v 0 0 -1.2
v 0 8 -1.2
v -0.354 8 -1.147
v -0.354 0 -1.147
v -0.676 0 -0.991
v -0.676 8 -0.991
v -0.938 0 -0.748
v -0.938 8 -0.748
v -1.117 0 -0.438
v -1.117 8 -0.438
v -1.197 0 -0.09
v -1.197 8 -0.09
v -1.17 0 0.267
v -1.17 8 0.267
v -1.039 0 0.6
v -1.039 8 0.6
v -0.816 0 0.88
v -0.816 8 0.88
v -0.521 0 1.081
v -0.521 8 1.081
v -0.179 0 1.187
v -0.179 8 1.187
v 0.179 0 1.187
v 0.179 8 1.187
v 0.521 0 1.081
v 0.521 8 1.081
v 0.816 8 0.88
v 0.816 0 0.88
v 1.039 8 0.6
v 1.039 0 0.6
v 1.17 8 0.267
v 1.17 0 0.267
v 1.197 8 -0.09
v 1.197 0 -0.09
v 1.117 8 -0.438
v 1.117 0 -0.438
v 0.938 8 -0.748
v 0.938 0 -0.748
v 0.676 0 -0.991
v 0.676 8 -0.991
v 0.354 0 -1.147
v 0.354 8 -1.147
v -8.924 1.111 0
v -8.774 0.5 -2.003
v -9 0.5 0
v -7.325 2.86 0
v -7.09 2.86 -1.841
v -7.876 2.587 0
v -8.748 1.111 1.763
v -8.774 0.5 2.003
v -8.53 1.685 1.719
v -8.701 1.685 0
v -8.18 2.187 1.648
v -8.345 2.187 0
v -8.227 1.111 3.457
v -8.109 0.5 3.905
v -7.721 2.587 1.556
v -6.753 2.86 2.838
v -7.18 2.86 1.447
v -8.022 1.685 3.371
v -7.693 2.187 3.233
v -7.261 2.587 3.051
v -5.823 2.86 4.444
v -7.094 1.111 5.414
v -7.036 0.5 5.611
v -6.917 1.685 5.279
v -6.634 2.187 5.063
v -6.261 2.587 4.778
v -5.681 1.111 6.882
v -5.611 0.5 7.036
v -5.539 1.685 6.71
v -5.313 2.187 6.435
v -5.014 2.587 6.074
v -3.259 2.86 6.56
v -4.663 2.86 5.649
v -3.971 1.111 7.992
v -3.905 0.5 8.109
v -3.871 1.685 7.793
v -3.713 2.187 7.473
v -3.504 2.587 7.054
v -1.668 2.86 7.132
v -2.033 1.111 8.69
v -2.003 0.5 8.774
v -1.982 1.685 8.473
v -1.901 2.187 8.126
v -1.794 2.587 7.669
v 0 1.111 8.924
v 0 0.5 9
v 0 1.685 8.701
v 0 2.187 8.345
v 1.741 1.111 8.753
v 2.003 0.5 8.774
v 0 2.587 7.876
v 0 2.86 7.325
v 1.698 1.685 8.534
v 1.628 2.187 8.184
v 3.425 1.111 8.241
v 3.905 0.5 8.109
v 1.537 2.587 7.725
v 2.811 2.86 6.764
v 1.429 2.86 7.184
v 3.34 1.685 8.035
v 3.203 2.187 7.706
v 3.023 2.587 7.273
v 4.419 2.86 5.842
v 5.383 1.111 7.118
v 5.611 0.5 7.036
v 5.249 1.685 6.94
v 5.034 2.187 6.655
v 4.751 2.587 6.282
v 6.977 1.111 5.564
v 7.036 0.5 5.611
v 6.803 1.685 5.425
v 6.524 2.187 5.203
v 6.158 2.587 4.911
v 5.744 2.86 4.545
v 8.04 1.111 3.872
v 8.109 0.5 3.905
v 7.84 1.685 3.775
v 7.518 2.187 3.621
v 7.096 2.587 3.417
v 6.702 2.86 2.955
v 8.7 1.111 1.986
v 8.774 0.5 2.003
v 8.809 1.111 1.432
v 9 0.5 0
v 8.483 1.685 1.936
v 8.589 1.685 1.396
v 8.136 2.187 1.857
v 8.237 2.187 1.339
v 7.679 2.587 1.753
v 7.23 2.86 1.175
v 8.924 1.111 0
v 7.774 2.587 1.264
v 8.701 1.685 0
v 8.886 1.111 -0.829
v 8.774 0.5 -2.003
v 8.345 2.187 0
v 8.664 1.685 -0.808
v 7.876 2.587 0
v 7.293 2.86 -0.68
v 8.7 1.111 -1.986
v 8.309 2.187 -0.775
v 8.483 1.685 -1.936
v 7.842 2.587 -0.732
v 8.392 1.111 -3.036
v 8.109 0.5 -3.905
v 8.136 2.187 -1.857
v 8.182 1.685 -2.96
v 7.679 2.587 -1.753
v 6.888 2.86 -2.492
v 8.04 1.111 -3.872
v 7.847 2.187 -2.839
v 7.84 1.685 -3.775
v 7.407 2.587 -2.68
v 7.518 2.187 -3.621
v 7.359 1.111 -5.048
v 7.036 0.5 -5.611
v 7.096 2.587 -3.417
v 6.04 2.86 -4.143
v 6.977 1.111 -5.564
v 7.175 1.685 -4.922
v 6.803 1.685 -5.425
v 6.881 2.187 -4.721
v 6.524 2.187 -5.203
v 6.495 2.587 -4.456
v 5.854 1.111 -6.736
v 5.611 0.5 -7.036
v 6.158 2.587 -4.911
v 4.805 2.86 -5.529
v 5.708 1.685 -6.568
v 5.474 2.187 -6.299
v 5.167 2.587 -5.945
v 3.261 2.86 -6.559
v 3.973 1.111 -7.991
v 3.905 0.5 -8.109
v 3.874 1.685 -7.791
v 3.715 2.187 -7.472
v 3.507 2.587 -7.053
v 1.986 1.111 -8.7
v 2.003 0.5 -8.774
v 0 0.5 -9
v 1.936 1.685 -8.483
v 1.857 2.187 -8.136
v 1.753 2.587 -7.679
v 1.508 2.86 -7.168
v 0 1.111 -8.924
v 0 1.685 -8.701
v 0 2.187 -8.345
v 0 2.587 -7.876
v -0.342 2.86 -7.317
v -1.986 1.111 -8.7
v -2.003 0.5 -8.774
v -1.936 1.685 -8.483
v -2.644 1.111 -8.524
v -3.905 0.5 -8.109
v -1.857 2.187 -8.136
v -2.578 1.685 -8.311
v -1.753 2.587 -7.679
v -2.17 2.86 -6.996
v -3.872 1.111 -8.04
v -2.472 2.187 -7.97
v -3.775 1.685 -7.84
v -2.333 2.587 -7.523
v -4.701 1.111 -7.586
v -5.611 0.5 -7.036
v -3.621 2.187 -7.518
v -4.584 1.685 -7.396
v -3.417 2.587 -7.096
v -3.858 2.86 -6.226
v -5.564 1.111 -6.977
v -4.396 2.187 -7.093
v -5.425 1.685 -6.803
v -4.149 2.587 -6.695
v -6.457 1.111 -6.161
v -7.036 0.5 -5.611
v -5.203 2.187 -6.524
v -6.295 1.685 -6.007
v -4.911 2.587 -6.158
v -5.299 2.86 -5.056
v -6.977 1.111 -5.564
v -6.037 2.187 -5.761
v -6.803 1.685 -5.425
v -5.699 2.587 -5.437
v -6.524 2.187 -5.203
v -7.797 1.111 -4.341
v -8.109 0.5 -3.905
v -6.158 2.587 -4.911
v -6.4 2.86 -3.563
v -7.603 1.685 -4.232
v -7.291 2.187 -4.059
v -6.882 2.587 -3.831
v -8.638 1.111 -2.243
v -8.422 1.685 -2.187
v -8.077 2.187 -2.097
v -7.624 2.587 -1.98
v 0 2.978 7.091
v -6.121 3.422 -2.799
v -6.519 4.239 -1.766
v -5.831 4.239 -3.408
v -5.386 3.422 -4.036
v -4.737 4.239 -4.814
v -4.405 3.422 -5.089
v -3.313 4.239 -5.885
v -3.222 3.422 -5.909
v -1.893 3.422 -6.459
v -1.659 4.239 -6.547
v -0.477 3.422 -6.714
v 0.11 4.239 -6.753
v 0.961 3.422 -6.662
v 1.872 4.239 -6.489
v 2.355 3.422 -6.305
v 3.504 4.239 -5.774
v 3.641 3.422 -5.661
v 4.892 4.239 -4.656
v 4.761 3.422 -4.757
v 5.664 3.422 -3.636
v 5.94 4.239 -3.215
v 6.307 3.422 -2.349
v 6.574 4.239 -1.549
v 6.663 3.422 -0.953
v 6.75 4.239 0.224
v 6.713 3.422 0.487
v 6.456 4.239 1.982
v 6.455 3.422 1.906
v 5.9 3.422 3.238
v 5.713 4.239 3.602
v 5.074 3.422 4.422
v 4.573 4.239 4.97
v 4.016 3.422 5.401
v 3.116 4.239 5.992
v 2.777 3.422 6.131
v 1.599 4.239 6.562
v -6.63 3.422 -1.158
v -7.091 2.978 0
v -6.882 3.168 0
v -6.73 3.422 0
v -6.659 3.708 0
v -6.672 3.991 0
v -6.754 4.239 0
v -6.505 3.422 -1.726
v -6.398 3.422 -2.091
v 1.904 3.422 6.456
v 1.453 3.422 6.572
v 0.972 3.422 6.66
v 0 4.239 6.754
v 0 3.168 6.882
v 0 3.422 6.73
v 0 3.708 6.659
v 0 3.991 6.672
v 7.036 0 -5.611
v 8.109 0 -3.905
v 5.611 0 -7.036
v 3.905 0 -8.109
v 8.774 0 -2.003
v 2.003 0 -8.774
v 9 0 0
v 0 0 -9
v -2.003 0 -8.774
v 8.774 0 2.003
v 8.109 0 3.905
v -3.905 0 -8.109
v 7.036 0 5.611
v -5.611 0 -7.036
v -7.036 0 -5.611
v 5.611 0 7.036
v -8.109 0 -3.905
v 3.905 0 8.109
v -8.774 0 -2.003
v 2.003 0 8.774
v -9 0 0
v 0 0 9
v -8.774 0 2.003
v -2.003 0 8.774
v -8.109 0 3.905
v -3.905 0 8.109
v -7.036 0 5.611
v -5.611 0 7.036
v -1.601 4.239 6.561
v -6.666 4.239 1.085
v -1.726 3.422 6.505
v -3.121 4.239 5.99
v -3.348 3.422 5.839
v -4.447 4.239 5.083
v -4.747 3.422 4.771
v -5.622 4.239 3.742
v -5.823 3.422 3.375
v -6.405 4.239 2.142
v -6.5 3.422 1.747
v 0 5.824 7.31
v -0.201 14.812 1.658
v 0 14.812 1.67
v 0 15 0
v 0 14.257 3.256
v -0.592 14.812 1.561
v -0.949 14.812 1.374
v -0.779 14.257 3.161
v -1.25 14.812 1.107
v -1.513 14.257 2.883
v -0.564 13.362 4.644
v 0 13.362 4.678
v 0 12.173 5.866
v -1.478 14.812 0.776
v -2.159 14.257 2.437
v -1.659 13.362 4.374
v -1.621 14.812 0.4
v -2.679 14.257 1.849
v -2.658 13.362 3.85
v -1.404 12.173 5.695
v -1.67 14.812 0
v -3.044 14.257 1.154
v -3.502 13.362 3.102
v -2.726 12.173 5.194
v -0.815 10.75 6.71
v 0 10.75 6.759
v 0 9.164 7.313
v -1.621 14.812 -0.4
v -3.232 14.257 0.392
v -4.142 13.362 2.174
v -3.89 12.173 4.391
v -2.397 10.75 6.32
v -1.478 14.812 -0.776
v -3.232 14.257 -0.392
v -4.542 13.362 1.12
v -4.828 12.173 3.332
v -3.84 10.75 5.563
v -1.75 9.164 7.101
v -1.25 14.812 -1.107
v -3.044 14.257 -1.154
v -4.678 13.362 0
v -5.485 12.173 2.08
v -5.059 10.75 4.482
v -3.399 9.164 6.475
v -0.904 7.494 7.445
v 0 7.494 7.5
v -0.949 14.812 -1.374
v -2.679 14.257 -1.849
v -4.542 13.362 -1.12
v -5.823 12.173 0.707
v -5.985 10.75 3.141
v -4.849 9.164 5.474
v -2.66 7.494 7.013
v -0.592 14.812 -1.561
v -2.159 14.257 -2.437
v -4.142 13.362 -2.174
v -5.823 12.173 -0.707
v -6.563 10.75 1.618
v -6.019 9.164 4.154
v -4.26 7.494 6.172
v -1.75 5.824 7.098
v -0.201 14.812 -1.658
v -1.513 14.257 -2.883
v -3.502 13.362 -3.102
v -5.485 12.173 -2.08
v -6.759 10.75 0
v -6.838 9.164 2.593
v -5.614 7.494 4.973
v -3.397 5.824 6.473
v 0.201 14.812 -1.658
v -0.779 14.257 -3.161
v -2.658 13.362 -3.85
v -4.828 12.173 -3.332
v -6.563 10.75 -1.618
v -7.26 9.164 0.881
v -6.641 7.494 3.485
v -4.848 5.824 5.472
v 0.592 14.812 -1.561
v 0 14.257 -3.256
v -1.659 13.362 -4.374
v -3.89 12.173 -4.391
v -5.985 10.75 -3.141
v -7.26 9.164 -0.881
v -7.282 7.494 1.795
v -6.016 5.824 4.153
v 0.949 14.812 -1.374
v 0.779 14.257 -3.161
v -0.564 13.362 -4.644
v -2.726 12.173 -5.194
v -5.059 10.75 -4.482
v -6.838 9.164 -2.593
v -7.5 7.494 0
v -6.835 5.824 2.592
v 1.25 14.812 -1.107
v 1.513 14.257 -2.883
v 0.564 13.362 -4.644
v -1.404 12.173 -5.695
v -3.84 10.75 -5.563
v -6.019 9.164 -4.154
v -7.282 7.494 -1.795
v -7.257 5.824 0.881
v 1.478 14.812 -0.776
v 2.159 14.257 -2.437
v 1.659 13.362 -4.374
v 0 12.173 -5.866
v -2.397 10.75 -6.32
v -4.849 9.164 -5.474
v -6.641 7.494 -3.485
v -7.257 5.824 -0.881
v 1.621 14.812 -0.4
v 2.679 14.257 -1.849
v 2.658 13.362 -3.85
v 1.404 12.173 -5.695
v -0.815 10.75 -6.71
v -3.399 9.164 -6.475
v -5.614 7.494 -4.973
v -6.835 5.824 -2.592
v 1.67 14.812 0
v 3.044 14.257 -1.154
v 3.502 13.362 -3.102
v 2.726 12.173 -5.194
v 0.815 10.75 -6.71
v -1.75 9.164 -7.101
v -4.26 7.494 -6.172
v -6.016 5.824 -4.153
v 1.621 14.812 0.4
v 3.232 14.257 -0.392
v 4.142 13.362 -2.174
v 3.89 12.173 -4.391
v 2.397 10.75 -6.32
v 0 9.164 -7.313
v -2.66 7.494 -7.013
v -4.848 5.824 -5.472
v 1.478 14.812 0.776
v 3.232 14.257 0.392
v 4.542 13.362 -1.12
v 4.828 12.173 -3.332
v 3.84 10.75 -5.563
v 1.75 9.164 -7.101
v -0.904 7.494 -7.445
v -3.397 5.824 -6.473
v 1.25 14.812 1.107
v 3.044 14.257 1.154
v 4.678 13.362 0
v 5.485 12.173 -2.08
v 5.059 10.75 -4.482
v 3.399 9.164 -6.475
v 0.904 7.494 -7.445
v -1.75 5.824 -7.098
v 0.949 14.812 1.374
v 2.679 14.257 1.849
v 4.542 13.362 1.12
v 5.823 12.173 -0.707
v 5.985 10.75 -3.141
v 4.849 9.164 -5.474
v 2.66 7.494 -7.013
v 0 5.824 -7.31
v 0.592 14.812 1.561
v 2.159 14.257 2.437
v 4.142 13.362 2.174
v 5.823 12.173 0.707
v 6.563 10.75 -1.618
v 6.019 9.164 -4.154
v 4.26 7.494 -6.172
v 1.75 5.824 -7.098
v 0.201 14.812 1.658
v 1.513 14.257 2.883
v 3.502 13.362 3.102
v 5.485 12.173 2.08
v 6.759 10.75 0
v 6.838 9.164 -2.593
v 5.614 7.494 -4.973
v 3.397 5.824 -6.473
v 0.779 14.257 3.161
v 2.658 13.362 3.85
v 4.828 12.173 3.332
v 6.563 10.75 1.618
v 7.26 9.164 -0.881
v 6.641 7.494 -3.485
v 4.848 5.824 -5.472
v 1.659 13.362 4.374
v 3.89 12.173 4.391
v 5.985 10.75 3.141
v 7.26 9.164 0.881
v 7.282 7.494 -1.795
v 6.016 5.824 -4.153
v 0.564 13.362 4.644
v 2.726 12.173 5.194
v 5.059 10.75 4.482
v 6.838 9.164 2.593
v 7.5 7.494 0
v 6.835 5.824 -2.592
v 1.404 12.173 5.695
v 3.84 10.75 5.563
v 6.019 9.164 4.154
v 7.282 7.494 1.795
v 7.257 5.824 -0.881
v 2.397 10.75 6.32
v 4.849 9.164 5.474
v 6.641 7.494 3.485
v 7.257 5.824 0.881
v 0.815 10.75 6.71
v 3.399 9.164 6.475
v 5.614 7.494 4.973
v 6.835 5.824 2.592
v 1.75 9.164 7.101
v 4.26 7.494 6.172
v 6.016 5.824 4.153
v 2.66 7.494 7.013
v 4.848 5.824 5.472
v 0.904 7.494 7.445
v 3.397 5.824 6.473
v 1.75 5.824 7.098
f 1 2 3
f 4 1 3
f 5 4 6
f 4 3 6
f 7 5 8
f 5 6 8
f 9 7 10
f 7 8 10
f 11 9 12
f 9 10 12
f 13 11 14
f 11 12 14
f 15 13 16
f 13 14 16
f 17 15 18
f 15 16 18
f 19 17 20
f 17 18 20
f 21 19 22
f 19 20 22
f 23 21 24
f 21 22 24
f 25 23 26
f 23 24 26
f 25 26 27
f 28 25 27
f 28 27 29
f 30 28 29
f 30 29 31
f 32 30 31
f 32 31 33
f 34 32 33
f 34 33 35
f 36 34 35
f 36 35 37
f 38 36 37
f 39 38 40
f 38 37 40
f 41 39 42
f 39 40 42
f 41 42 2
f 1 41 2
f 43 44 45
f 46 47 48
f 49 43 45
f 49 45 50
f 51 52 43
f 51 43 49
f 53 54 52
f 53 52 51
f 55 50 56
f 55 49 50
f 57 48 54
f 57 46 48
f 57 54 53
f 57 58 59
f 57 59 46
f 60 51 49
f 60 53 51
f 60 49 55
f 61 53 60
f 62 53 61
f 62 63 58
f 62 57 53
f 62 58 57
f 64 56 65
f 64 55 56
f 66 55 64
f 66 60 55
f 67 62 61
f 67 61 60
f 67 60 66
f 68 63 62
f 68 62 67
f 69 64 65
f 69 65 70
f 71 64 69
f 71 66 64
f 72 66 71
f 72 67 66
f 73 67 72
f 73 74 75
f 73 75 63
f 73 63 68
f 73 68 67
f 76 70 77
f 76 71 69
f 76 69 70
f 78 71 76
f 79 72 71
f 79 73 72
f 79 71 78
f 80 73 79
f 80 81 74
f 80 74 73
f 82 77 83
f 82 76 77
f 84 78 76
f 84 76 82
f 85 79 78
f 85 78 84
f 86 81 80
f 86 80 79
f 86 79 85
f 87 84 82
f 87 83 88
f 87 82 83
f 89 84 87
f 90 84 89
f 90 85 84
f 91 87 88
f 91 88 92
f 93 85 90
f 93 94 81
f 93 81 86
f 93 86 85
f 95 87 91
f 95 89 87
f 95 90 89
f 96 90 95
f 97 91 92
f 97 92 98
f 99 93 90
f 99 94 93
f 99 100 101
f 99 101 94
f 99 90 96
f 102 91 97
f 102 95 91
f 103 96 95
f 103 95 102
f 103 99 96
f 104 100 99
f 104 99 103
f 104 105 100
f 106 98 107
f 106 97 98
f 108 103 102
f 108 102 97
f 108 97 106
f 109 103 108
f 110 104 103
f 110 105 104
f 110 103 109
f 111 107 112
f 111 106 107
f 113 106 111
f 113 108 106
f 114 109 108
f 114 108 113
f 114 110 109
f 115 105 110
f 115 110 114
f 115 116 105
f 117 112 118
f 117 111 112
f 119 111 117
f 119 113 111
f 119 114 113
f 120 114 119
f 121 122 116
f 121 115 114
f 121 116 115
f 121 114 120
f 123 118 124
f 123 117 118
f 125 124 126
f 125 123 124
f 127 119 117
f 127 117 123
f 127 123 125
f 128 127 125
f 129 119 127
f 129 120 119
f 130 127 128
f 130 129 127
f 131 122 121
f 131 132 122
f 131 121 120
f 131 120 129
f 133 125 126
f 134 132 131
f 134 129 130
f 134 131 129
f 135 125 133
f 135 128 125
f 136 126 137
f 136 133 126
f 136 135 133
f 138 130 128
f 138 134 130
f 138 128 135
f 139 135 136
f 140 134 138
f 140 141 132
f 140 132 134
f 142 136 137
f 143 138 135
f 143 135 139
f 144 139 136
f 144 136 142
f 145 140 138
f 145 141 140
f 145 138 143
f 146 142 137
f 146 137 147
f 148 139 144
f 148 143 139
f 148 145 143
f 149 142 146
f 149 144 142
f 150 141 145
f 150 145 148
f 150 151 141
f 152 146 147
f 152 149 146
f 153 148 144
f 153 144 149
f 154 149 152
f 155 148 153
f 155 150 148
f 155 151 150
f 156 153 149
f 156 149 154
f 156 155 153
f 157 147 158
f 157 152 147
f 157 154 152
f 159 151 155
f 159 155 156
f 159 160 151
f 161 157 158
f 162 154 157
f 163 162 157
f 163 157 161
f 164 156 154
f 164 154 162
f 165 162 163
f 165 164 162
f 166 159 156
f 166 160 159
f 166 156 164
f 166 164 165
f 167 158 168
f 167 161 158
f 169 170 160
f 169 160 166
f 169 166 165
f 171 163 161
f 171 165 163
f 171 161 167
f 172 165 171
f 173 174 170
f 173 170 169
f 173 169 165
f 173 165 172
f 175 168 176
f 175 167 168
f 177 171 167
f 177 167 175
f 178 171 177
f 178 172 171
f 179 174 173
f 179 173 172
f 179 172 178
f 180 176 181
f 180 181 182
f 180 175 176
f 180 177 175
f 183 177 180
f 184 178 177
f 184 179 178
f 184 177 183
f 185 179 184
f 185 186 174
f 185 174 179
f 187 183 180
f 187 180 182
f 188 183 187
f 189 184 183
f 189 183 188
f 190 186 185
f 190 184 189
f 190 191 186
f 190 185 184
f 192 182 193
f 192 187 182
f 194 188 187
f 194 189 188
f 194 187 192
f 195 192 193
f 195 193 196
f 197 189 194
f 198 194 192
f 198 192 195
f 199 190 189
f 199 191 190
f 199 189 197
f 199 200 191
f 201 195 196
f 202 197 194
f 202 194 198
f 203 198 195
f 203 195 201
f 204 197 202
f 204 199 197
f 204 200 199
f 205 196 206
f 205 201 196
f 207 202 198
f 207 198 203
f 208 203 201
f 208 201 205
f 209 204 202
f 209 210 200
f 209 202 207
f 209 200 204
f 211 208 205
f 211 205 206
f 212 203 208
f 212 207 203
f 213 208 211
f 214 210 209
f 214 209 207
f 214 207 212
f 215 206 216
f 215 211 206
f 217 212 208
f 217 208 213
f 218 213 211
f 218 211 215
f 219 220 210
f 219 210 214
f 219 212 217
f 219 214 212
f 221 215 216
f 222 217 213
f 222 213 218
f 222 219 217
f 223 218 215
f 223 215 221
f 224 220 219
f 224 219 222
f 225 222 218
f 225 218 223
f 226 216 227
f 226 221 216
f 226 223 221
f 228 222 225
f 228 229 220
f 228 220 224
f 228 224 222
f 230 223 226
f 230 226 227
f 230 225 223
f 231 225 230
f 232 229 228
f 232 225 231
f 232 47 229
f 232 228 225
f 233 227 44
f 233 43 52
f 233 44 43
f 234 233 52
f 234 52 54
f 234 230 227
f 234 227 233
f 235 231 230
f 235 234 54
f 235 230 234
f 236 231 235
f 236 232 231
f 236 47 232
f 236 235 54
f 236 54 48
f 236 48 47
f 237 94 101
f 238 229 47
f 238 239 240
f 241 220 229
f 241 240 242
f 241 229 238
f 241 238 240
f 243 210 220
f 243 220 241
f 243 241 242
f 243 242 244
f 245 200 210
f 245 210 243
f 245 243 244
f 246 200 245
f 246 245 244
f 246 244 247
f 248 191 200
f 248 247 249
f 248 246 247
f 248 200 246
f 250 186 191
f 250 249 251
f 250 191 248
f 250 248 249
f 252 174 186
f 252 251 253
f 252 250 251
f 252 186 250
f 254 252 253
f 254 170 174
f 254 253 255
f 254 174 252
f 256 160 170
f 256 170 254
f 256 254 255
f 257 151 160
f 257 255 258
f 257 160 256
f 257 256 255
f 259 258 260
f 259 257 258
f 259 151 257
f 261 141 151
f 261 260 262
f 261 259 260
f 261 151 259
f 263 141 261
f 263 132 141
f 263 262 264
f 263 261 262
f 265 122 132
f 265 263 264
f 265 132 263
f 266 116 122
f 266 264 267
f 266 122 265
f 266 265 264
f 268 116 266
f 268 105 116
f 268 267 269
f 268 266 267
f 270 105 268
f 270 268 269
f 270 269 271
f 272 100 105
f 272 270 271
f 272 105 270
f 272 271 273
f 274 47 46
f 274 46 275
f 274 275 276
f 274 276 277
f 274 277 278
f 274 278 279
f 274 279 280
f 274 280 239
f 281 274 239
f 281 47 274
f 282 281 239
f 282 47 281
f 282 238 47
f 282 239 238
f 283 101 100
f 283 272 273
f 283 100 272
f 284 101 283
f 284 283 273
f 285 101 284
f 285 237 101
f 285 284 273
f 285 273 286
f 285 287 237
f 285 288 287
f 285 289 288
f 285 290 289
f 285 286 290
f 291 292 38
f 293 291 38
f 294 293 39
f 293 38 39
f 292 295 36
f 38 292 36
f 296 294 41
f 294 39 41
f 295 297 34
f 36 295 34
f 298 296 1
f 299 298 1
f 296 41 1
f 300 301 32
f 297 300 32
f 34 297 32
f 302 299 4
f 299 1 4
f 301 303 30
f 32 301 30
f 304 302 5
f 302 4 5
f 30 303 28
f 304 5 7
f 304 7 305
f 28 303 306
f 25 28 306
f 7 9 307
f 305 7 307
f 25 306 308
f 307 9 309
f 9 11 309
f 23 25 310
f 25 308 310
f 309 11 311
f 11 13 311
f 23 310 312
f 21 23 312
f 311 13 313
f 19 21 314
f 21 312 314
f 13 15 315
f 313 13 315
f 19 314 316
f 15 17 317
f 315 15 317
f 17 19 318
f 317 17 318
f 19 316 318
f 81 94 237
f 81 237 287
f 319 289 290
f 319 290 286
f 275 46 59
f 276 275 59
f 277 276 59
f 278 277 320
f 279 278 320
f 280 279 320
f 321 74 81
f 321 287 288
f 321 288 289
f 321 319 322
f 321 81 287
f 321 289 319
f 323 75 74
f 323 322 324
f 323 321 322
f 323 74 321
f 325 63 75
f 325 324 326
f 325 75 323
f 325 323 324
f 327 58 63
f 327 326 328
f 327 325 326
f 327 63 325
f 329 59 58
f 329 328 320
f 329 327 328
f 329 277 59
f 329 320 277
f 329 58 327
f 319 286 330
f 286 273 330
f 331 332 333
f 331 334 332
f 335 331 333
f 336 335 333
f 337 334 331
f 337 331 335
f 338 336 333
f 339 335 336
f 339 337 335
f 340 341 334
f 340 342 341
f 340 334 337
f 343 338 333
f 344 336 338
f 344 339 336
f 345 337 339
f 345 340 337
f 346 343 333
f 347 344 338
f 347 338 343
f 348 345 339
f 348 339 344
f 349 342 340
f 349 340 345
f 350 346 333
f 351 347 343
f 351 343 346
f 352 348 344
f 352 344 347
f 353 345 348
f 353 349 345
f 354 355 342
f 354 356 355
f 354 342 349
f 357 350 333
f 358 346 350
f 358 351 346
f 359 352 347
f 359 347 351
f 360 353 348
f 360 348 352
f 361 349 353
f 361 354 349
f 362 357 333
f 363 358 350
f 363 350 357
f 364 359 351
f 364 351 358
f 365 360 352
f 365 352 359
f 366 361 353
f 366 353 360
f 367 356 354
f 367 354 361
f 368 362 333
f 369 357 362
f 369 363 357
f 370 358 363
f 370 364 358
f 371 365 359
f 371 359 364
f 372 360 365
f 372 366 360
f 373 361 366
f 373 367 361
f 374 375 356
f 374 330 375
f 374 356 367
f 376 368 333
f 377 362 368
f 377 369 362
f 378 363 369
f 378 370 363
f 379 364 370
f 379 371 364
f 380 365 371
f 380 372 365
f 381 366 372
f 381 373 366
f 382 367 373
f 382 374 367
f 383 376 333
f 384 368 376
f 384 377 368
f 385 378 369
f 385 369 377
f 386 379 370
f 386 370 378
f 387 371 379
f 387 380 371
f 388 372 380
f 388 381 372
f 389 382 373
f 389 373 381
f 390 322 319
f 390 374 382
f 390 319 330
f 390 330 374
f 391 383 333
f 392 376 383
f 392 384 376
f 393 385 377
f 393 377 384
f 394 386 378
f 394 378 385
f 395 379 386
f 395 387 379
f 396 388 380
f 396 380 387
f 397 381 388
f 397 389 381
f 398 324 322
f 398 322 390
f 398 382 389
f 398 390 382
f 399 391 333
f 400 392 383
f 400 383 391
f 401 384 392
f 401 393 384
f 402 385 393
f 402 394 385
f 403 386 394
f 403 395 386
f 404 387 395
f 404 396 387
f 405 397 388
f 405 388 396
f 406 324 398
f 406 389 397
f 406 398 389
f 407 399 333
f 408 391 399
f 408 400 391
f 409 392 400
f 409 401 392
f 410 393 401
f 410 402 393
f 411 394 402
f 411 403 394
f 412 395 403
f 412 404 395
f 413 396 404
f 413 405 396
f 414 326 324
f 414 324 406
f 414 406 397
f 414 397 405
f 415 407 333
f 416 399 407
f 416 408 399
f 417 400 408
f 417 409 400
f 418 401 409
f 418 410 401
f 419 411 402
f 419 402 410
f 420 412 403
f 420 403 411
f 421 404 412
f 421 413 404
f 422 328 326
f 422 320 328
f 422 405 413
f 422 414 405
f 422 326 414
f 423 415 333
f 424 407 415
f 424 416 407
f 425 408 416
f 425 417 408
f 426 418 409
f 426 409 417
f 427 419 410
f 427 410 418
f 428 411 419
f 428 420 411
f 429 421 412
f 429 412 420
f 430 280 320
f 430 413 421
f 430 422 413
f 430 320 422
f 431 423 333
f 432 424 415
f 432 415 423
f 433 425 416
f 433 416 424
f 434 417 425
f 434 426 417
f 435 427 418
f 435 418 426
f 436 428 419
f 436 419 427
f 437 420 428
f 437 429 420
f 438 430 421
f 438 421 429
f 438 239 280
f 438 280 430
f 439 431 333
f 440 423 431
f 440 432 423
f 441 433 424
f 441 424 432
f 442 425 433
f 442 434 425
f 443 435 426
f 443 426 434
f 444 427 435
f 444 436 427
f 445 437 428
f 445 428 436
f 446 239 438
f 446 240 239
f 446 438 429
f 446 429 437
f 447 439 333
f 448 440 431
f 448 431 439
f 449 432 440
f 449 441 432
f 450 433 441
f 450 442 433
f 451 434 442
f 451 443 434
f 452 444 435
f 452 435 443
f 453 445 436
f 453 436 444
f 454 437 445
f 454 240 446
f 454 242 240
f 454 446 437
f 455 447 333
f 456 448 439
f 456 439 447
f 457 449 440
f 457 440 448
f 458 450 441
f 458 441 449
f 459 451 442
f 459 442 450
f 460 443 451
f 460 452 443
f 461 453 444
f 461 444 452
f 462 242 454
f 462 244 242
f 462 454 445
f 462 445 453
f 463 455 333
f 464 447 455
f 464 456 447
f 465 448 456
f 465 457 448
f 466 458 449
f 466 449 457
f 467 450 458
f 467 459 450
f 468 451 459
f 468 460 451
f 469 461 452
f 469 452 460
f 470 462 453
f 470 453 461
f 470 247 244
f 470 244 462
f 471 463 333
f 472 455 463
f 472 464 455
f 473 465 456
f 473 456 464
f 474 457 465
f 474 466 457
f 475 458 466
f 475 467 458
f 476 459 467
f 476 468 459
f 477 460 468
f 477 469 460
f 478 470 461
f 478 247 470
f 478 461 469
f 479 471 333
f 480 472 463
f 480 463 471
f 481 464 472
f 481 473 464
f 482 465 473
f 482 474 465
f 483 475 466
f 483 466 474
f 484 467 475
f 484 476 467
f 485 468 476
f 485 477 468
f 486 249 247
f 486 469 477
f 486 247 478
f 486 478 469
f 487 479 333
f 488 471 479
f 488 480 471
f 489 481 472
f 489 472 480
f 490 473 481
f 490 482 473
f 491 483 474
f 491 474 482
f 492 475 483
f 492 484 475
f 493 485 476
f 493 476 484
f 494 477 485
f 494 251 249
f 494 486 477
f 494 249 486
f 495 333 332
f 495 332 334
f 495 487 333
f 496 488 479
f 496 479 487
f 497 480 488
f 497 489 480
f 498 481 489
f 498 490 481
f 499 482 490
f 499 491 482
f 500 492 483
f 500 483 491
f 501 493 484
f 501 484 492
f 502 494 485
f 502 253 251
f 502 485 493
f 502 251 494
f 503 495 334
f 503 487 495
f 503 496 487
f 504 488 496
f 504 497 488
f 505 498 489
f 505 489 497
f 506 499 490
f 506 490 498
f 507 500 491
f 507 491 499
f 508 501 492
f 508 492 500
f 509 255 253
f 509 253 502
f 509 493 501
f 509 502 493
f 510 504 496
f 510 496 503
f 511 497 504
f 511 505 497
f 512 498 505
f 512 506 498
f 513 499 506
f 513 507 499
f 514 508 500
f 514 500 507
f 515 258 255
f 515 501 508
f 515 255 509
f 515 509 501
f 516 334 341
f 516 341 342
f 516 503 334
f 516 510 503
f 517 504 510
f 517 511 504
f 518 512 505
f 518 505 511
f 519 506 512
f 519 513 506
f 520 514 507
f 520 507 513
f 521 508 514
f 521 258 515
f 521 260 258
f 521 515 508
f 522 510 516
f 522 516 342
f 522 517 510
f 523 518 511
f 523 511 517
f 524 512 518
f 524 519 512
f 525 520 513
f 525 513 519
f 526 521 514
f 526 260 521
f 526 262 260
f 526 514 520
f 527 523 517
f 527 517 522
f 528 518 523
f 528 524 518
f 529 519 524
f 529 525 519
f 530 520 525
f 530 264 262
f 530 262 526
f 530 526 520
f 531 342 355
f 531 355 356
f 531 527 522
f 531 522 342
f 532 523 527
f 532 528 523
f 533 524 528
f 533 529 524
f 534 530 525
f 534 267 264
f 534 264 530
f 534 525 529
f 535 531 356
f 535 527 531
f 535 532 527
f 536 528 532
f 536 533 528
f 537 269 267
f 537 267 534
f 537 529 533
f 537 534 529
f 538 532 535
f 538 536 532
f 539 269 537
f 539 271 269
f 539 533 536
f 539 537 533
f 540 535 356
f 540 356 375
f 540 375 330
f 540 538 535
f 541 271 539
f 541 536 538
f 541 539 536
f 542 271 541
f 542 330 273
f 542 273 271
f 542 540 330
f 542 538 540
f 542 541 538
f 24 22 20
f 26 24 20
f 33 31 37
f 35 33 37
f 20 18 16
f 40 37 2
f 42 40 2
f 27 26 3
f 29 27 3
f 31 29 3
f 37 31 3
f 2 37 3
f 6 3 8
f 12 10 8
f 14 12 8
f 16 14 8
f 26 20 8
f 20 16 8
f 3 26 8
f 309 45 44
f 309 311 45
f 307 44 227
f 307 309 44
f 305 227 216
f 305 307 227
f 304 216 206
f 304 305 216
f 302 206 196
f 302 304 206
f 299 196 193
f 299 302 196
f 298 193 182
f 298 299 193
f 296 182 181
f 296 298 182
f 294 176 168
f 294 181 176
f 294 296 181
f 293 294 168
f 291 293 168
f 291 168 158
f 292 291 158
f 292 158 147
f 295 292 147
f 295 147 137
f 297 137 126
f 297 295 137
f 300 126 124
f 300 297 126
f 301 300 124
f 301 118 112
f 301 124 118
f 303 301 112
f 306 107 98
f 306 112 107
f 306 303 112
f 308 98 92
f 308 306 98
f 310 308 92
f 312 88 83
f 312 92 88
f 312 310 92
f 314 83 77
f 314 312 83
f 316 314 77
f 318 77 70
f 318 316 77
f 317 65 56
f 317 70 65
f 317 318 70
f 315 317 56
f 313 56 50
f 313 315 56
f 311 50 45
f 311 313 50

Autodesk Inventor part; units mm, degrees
ref_plane "YZ Plane" through (0, 0, 0) normal (1, 0, 0) x (0, 1, 0)
ref_plane "XZ Plane" through (0, 0, 0) normal (0, 1, 0) x (-1, 0, 0)
ref_plane "XY Plane" through (0, 0, 0) normal (0, 0, 1) x (1, 0, 0)
sketch "Esboço1" plane through (0, 0, 0) normal (0, 1, 0) x (-1, 0, 0)
  circle A0 centre (0, 0) radius 9
  dimension "d0" = 18
extrude "Extrusão1" add sketch "Esboço1" along normal blind 3
fillet "Arredondamento1" radius 2.5 1 edges at (9, 3, 0)
sketch "Esboço2" plane through (0, 0, 0) normal (1, 0, 0) x (0, 1, 0)
  line L0 (3, 6.5) -> (3, -6.5) projected
  line L1 (0, 0) -> (13.7463, 0)
  arc A0 (15, 0) -> (0, 0) centre (7.5, 0) ccw
  line L2 (0, 9) -> (0, -9) projected
  line L3 (15, 0) -> (0, 0)
  dimension "d4" = 15
revolve "Revolução1" add sketch "Esboço2" angle 360 about axis through (0, 0, 0) along (0, 1, 0)
fillet "Arredondamento2" radius 1 1 edges at (0, 3, -6)
hole "Furo1" at (0, 0, 0) direction (0, 1, 0) diameter 2.4 depth 8 clearance for "Countersunk Flat Head Screw ISO 2009/7046" size "M2" standard "ISO"
properties part number "Puxador" material "Plástico PC/ABS"
